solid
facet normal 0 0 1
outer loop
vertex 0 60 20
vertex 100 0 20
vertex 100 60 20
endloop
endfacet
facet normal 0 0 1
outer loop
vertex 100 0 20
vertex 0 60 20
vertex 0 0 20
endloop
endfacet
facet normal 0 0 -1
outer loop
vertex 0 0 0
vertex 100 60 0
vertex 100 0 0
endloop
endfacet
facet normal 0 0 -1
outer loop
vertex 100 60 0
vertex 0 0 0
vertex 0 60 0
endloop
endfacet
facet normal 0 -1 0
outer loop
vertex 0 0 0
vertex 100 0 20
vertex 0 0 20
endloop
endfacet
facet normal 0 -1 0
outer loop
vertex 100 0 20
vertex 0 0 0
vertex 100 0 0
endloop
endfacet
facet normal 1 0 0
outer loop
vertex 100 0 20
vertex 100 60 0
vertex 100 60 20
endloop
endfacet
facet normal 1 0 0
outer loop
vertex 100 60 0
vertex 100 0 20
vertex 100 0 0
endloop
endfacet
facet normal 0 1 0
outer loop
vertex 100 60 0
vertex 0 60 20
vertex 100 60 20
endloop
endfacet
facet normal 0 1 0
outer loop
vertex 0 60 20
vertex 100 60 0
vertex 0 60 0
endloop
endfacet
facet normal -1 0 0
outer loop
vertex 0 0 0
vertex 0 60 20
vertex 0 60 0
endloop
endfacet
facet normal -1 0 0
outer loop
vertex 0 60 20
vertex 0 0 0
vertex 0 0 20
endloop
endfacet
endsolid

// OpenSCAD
// scad/optimization_domain.scad
// Simple box — no holes, no fillets — for topology optimization mesh.
// Features are added back in post-processing.
LENGTH = 100.0;
WIDTH  = 60.0;
HEIGHT = 20.0;

cube([LENGTH, WIDTH, HEIGHT]);
